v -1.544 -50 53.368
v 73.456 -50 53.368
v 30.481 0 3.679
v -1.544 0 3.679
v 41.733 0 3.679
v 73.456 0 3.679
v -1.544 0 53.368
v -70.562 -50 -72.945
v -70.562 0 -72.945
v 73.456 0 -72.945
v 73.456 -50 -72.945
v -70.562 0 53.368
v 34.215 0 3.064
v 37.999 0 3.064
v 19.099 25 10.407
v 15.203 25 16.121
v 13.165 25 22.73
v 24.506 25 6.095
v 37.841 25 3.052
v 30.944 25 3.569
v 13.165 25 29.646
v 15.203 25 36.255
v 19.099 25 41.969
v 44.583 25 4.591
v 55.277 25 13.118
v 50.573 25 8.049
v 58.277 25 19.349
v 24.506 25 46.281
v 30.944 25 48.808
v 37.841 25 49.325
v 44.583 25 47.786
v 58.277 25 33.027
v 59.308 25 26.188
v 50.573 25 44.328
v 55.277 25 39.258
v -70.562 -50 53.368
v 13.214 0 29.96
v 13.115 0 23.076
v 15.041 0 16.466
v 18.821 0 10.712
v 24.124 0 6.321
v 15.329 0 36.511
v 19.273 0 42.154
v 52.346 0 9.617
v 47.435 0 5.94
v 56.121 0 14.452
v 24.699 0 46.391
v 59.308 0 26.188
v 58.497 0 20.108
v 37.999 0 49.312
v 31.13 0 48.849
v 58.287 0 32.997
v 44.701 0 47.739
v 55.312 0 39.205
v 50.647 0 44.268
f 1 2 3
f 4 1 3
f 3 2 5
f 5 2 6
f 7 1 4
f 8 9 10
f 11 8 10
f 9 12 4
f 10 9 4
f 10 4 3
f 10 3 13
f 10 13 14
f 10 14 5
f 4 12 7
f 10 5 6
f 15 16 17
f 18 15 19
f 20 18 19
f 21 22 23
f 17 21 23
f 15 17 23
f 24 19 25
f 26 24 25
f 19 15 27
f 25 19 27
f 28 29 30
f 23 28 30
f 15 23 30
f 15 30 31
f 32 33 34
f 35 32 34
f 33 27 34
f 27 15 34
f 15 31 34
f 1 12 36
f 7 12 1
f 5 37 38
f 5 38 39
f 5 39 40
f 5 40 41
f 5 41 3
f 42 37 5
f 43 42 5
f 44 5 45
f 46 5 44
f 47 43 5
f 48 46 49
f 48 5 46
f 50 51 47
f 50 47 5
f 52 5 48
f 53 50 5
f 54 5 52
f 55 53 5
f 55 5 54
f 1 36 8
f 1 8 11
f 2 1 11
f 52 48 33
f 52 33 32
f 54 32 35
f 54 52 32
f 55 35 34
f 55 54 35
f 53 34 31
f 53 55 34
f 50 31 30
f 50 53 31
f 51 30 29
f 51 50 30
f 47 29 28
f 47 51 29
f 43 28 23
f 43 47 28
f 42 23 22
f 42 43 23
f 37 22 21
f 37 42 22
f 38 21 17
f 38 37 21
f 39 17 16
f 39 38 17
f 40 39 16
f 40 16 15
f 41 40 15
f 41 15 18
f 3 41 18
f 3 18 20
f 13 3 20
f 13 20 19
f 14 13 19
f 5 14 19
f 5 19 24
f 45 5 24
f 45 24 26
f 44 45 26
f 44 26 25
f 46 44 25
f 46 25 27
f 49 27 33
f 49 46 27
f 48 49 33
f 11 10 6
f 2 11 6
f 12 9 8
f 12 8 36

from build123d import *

# Parameters (mm, degrees)
F0_W     = 144.018009305
F0_H     = 126.3136602938
F1_DEPTH = 50
F3_DEPTH = 75
F4_R     = 23.2012812913
F5_DEPTH = 25


with BuildPart() as f1:
    # F0 (on Front) → F1 (new body)
    with BuildSketch(Plane.XZ):
        with Locations((1.4469921589, -9.7884591669)):
            Rectangle(F0_W, F0_H)
    extrude(amount=F1_DEPTH)

    # F2 (on face) → F3 (cut)
    with BuildSketch(Plane.YZ.offset(73.4559968114)):
        Polygon((0, 53.36837098), (-50, 53.36837098), (0, 3.6792913452), align=None)
    extrude(amount=-F3_DEPTH, mode=Mode.SUBTRACT)

    # F4 (on face) → F5 (join)
    with BuildSketch(Plane.XZ):
        with Locations((36.1069515347, 26.1881500483)):
            Circle(F4_R)
    extrude(amount=-F5_DEPTH)


solid = f1.part
